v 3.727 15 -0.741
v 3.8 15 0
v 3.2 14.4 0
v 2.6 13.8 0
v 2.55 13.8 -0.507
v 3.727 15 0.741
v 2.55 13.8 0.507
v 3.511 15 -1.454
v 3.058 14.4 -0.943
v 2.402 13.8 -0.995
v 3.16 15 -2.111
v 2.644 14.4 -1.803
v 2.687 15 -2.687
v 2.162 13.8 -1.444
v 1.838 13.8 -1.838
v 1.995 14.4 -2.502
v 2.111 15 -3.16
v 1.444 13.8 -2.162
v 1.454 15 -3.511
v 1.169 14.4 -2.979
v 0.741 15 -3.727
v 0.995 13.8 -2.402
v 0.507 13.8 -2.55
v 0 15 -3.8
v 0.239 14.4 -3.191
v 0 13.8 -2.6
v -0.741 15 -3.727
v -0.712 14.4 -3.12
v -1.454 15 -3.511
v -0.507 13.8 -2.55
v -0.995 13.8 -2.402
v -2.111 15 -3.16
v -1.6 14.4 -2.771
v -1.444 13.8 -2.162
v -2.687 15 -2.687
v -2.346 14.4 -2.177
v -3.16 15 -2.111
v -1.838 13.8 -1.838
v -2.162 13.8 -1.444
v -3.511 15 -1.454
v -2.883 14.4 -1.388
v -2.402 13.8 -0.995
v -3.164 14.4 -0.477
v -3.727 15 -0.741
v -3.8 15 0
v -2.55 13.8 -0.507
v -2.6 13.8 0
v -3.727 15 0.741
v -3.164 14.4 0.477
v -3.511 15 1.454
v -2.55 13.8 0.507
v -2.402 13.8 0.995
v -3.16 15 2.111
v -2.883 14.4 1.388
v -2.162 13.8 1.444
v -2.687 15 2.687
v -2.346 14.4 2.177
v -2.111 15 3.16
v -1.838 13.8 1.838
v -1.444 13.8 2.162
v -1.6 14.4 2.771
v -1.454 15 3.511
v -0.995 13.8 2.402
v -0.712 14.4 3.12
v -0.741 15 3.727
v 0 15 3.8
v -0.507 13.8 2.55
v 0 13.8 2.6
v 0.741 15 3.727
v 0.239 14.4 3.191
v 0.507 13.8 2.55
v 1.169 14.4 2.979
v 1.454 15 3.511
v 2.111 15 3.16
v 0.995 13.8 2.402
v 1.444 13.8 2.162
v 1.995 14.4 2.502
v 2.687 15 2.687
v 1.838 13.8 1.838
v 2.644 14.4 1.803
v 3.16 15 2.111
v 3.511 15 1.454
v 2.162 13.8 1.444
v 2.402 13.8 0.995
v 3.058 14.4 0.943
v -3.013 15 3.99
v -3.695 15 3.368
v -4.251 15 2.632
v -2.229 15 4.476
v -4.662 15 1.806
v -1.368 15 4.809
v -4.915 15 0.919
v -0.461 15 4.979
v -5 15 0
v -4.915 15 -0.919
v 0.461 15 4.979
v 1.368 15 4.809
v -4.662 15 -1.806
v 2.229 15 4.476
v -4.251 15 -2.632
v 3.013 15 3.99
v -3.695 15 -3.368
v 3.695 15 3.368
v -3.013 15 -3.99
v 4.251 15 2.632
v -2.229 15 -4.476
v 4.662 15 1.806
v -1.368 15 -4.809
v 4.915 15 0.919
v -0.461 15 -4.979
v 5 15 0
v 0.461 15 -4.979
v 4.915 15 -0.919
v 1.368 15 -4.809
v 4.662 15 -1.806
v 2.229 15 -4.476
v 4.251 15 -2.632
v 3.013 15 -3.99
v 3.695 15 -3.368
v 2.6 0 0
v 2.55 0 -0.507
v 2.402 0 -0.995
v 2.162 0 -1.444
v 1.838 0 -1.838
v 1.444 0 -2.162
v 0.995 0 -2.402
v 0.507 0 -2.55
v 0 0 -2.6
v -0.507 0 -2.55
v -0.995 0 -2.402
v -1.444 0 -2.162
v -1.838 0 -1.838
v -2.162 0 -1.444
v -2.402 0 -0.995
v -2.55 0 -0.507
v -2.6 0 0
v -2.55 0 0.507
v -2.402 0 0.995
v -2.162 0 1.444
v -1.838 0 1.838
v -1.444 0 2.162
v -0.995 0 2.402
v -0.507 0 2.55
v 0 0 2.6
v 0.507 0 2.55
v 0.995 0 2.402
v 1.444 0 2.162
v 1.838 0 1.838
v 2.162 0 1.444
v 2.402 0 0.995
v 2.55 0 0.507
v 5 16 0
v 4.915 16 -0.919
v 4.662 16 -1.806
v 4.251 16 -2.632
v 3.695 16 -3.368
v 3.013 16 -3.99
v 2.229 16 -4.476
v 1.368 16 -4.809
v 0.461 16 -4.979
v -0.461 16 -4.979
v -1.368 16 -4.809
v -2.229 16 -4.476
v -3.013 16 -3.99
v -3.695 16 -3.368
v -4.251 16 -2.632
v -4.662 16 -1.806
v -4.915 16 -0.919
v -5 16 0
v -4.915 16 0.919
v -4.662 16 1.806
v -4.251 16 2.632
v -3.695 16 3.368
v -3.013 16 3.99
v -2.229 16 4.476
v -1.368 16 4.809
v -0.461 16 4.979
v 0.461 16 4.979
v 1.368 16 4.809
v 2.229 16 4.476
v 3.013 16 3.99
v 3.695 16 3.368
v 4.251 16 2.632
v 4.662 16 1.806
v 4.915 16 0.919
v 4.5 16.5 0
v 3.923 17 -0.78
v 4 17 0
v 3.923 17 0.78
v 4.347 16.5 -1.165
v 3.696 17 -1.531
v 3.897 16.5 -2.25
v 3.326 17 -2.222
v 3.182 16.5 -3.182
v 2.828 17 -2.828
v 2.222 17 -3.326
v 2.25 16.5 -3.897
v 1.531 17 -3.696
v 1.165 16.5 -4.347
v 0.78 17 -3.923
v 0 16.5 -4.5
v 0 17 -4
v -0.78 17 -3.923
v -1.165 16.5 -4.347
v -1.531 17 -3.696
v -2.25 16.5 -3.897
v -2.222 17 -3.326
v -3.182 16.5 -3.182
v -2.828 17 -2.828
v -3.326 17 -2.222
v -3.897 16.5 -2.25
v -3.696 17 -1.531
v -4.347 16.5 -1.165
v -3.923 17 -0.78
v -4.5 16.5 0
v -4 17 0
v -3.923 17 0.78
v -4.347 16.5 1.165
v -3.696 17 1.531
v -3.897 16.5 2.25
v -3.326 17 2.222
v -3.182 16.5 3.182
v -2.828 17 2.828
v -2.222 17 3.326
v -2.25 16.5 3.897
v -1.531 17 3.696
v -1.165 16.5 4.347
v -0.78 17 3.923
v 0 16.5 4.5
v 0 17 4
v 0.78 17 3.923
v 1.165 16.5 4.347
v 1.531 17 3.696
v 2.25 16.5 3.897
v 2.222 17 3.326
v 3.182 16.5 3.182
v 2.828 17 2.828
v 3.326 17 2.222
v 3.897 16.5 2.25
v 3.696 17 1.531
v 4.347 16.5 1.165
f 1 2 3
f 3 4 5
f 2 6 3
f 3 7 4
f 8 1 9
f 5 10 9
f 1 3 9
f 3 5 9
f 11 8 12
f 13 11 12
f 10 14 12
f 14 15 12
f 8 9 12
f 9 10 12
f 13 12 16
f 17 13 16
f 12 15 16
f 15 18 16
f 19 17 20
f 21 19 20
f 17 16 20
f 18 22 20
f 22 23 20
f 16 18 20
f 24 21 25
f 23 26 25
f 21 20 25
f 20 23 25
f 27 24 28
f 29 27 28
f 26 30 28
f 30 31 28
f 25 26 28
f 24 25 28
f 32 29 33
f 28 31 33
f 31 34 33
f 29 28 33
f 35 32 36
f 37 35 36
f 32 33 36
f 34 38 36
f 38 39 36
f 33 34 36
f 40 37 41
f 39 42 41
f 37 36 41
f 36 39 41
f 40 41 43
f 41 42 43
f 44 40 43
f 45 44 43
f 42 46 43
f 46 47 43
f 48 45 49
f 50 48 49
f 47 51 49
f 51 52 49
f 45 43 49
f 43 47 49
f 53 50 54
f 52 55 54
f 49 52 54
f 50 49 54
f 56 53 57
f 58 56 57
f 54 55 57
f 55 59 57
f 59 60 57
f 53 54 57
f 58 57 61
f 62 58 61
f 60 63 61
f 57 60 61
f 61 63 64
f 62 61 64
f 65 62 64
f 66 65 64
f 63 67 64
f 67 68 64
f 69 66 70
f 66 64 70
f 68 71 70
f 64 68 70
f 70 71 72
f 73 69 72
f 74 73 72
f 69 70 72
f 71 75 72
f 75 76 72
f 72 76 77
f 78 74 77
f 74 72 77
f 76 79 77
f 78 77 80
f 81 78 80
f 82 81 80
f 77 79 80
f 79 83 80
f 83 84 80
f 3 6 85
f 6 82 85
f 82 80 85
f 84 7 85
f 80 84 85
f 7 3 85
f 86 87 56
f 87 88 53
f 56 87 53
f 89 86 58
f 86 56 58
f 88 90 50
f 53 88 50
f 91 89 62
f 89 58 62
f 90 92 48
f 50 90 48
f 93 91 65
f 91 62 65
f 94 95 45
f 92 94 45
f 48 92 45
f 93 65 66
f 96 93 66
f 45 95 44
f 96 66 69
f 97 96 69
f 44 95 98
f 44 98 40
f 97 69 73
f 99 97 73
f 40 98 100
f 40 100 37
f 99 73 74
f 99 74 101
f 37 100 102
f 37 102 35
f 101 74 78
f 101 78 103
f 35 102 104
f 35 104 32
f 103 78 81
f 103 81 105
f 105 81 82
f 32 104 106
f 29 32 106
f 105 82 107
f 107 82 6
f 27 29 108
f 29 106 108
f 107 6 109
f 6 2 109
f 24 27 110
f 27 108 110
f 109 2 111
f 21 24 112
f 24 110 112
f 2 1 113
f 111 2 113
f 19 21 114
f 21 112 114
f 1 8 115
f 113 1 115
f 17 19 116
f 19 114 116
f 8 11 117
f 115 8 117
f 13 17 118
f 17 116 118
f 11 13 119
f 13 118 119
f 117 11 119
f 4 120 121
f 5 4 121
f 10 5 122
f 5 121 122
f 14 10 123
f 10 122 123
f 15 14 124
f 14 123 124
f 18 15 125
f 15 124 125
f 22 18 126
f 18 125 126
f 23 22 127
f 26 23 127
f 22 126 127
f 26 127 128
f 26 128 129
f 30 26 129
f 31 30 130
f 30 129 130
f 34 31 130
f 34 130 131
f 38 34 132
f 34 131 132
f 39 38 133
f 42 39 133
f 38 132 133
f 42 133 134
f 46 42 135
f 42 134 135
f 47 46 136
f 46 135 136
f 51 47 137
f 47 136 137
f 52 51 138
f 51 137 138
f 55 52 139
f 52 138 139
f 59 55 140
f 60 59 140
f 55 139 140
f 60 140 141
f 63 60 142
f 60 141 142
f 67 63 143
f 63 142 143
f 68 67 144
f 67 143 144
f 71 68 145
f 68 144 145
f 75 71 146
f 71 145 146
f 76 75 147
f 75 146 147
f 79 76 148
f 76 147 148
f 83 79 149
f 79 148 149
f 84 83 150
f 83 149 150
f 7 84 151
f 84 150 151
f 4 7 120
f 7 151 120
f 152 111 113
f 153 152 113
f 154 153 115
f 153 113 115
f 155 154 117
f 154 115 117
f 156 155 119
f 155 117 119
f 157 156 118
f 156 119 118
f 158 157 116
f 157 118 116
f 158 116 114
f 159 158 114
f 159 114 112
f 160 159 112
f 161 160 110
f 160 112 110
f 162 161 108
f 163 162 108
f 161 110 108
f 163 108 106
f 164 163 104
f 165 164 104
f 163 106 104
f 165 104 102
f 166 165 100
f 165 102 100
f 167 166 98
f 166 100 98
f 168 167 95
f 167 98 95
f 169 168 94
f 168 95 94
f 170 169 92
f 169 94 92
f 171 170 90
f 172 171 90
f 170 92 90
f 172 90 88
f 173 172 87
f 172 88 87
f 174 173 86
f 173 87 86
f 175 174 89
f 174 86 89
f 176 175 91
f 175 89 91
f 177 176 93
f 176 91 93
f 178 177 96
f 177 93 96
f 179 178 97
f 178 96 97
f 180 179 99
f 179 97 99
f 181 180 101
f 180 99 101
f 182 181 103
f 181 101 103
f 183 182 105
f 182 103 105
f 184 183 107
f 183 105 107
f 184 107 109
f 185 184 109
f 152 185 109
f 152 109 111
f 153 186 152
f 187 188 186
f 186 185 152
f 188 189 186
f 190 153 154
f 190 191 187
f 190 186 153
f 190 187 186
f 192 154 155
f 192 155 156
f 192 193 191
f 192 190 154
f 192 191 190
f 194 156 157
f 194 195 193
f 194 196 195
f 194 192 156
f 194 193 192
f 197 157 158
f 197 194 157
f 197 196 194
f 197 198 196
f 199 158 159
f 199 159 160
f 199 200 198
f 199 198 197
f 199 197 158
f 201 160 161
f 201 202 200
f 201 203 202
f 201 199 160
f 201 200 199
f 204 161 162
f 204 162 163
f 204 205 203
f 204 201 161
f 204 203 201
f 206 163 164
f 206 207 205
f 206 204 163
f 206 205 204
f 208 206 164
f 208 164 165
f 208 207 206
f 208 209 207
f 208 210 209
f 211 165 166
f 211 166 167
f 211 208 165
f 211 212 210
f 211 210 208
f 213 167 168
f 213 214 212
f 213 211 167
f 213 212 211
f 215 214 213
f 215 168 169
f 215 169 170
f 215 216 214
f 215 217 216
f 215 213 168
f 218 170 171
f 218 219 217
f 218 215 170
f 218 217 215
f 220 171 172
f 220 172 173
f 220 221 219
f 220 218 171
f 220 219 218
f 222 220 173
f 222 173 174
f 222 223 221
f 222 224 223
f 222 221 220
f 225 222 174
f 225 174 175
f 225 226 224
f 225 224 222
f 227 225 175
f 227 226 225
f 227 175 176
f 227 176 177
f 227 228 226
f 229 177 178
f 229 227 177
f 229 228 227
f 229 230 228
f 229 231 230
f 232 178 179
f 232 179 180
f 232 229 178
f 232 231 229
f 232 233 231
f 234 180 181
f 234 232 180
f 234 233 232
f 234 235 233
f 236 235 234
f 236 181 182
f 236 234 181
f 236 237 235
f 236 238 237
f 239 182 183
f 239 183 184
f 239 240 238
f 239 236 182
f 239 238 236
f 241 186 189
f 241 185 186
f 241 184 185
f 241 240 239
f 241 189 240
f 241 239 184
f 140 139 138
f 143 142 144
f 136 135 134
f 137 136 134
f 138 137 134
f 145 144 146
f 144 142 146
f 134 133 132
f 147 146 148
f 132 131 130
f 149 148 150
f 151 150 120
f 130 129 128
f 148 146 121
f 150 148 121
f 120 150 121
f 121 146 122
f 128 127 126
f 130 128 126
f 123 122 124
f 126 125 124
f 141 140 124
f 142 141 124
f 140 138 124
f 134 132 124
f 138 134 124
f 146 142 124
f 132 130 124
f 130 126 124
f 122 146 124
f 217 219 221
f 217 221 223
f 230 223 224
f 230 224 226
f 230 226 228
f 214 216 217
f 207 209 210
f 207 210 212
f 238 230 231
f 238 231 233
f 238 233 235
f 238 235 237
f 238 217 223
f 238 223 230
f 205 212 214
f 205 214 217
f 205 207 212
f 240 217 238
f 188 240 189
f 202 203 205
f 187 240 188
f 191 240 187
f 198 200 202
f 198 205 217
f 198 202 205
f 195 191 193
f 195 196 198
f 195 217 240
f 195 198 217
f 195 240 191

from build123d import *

# Parameters (mm, degrees)
SKETCH1_R           = 2.6
BOSS_EXTRUDE1_DEPTH = 15
SKETCH2_R           = 5
BOSS_EXTRUDE2_DEPTH = 2
CHAMFER1_SIZE       = 1.2
CHAMFER2_SIZE       = 1


with BuildPart() as part:
    # Sketch1 → Boss-Extrude1 (new body)
    with BuildSketch(Plane(origin=(0, 0, 0), x_dir=(1, 0, 0), z_dir=(0, 1, 0))):
        Circle(SKETCH1_R)
    extrude(amount=BOSS_EXTRUDE1_DEPTH)

    # Sketch2 → Boss-Extrude2 (add)
    with BuildSketch(Plane(origin=(0, 15, 0), x_dir=(1, 0, 0), z_dir=(0, 1, 0))):
        Circle(SKETCH2_R)
    extrude(amount=BOSS_EXTRUDE2_DEPTH)

    # Chamfer1
    chamfer1_edges = [part.edges().sort_by_distance(p)[0] for p in [
        (-2.6, 15, 0),
    ]]
    chamfer(chamfer1_edges, length=CHAMFER1_SIZE)

    # Chamfer2
    chamfer2_edges = [part.edges().sort_by_distance(p)[0] for p in [
        (-5, 17, 0),
    ]]
    chamfer(chamfer2_edges, length=CHAMFER2_SIZE)


solid = part.part
